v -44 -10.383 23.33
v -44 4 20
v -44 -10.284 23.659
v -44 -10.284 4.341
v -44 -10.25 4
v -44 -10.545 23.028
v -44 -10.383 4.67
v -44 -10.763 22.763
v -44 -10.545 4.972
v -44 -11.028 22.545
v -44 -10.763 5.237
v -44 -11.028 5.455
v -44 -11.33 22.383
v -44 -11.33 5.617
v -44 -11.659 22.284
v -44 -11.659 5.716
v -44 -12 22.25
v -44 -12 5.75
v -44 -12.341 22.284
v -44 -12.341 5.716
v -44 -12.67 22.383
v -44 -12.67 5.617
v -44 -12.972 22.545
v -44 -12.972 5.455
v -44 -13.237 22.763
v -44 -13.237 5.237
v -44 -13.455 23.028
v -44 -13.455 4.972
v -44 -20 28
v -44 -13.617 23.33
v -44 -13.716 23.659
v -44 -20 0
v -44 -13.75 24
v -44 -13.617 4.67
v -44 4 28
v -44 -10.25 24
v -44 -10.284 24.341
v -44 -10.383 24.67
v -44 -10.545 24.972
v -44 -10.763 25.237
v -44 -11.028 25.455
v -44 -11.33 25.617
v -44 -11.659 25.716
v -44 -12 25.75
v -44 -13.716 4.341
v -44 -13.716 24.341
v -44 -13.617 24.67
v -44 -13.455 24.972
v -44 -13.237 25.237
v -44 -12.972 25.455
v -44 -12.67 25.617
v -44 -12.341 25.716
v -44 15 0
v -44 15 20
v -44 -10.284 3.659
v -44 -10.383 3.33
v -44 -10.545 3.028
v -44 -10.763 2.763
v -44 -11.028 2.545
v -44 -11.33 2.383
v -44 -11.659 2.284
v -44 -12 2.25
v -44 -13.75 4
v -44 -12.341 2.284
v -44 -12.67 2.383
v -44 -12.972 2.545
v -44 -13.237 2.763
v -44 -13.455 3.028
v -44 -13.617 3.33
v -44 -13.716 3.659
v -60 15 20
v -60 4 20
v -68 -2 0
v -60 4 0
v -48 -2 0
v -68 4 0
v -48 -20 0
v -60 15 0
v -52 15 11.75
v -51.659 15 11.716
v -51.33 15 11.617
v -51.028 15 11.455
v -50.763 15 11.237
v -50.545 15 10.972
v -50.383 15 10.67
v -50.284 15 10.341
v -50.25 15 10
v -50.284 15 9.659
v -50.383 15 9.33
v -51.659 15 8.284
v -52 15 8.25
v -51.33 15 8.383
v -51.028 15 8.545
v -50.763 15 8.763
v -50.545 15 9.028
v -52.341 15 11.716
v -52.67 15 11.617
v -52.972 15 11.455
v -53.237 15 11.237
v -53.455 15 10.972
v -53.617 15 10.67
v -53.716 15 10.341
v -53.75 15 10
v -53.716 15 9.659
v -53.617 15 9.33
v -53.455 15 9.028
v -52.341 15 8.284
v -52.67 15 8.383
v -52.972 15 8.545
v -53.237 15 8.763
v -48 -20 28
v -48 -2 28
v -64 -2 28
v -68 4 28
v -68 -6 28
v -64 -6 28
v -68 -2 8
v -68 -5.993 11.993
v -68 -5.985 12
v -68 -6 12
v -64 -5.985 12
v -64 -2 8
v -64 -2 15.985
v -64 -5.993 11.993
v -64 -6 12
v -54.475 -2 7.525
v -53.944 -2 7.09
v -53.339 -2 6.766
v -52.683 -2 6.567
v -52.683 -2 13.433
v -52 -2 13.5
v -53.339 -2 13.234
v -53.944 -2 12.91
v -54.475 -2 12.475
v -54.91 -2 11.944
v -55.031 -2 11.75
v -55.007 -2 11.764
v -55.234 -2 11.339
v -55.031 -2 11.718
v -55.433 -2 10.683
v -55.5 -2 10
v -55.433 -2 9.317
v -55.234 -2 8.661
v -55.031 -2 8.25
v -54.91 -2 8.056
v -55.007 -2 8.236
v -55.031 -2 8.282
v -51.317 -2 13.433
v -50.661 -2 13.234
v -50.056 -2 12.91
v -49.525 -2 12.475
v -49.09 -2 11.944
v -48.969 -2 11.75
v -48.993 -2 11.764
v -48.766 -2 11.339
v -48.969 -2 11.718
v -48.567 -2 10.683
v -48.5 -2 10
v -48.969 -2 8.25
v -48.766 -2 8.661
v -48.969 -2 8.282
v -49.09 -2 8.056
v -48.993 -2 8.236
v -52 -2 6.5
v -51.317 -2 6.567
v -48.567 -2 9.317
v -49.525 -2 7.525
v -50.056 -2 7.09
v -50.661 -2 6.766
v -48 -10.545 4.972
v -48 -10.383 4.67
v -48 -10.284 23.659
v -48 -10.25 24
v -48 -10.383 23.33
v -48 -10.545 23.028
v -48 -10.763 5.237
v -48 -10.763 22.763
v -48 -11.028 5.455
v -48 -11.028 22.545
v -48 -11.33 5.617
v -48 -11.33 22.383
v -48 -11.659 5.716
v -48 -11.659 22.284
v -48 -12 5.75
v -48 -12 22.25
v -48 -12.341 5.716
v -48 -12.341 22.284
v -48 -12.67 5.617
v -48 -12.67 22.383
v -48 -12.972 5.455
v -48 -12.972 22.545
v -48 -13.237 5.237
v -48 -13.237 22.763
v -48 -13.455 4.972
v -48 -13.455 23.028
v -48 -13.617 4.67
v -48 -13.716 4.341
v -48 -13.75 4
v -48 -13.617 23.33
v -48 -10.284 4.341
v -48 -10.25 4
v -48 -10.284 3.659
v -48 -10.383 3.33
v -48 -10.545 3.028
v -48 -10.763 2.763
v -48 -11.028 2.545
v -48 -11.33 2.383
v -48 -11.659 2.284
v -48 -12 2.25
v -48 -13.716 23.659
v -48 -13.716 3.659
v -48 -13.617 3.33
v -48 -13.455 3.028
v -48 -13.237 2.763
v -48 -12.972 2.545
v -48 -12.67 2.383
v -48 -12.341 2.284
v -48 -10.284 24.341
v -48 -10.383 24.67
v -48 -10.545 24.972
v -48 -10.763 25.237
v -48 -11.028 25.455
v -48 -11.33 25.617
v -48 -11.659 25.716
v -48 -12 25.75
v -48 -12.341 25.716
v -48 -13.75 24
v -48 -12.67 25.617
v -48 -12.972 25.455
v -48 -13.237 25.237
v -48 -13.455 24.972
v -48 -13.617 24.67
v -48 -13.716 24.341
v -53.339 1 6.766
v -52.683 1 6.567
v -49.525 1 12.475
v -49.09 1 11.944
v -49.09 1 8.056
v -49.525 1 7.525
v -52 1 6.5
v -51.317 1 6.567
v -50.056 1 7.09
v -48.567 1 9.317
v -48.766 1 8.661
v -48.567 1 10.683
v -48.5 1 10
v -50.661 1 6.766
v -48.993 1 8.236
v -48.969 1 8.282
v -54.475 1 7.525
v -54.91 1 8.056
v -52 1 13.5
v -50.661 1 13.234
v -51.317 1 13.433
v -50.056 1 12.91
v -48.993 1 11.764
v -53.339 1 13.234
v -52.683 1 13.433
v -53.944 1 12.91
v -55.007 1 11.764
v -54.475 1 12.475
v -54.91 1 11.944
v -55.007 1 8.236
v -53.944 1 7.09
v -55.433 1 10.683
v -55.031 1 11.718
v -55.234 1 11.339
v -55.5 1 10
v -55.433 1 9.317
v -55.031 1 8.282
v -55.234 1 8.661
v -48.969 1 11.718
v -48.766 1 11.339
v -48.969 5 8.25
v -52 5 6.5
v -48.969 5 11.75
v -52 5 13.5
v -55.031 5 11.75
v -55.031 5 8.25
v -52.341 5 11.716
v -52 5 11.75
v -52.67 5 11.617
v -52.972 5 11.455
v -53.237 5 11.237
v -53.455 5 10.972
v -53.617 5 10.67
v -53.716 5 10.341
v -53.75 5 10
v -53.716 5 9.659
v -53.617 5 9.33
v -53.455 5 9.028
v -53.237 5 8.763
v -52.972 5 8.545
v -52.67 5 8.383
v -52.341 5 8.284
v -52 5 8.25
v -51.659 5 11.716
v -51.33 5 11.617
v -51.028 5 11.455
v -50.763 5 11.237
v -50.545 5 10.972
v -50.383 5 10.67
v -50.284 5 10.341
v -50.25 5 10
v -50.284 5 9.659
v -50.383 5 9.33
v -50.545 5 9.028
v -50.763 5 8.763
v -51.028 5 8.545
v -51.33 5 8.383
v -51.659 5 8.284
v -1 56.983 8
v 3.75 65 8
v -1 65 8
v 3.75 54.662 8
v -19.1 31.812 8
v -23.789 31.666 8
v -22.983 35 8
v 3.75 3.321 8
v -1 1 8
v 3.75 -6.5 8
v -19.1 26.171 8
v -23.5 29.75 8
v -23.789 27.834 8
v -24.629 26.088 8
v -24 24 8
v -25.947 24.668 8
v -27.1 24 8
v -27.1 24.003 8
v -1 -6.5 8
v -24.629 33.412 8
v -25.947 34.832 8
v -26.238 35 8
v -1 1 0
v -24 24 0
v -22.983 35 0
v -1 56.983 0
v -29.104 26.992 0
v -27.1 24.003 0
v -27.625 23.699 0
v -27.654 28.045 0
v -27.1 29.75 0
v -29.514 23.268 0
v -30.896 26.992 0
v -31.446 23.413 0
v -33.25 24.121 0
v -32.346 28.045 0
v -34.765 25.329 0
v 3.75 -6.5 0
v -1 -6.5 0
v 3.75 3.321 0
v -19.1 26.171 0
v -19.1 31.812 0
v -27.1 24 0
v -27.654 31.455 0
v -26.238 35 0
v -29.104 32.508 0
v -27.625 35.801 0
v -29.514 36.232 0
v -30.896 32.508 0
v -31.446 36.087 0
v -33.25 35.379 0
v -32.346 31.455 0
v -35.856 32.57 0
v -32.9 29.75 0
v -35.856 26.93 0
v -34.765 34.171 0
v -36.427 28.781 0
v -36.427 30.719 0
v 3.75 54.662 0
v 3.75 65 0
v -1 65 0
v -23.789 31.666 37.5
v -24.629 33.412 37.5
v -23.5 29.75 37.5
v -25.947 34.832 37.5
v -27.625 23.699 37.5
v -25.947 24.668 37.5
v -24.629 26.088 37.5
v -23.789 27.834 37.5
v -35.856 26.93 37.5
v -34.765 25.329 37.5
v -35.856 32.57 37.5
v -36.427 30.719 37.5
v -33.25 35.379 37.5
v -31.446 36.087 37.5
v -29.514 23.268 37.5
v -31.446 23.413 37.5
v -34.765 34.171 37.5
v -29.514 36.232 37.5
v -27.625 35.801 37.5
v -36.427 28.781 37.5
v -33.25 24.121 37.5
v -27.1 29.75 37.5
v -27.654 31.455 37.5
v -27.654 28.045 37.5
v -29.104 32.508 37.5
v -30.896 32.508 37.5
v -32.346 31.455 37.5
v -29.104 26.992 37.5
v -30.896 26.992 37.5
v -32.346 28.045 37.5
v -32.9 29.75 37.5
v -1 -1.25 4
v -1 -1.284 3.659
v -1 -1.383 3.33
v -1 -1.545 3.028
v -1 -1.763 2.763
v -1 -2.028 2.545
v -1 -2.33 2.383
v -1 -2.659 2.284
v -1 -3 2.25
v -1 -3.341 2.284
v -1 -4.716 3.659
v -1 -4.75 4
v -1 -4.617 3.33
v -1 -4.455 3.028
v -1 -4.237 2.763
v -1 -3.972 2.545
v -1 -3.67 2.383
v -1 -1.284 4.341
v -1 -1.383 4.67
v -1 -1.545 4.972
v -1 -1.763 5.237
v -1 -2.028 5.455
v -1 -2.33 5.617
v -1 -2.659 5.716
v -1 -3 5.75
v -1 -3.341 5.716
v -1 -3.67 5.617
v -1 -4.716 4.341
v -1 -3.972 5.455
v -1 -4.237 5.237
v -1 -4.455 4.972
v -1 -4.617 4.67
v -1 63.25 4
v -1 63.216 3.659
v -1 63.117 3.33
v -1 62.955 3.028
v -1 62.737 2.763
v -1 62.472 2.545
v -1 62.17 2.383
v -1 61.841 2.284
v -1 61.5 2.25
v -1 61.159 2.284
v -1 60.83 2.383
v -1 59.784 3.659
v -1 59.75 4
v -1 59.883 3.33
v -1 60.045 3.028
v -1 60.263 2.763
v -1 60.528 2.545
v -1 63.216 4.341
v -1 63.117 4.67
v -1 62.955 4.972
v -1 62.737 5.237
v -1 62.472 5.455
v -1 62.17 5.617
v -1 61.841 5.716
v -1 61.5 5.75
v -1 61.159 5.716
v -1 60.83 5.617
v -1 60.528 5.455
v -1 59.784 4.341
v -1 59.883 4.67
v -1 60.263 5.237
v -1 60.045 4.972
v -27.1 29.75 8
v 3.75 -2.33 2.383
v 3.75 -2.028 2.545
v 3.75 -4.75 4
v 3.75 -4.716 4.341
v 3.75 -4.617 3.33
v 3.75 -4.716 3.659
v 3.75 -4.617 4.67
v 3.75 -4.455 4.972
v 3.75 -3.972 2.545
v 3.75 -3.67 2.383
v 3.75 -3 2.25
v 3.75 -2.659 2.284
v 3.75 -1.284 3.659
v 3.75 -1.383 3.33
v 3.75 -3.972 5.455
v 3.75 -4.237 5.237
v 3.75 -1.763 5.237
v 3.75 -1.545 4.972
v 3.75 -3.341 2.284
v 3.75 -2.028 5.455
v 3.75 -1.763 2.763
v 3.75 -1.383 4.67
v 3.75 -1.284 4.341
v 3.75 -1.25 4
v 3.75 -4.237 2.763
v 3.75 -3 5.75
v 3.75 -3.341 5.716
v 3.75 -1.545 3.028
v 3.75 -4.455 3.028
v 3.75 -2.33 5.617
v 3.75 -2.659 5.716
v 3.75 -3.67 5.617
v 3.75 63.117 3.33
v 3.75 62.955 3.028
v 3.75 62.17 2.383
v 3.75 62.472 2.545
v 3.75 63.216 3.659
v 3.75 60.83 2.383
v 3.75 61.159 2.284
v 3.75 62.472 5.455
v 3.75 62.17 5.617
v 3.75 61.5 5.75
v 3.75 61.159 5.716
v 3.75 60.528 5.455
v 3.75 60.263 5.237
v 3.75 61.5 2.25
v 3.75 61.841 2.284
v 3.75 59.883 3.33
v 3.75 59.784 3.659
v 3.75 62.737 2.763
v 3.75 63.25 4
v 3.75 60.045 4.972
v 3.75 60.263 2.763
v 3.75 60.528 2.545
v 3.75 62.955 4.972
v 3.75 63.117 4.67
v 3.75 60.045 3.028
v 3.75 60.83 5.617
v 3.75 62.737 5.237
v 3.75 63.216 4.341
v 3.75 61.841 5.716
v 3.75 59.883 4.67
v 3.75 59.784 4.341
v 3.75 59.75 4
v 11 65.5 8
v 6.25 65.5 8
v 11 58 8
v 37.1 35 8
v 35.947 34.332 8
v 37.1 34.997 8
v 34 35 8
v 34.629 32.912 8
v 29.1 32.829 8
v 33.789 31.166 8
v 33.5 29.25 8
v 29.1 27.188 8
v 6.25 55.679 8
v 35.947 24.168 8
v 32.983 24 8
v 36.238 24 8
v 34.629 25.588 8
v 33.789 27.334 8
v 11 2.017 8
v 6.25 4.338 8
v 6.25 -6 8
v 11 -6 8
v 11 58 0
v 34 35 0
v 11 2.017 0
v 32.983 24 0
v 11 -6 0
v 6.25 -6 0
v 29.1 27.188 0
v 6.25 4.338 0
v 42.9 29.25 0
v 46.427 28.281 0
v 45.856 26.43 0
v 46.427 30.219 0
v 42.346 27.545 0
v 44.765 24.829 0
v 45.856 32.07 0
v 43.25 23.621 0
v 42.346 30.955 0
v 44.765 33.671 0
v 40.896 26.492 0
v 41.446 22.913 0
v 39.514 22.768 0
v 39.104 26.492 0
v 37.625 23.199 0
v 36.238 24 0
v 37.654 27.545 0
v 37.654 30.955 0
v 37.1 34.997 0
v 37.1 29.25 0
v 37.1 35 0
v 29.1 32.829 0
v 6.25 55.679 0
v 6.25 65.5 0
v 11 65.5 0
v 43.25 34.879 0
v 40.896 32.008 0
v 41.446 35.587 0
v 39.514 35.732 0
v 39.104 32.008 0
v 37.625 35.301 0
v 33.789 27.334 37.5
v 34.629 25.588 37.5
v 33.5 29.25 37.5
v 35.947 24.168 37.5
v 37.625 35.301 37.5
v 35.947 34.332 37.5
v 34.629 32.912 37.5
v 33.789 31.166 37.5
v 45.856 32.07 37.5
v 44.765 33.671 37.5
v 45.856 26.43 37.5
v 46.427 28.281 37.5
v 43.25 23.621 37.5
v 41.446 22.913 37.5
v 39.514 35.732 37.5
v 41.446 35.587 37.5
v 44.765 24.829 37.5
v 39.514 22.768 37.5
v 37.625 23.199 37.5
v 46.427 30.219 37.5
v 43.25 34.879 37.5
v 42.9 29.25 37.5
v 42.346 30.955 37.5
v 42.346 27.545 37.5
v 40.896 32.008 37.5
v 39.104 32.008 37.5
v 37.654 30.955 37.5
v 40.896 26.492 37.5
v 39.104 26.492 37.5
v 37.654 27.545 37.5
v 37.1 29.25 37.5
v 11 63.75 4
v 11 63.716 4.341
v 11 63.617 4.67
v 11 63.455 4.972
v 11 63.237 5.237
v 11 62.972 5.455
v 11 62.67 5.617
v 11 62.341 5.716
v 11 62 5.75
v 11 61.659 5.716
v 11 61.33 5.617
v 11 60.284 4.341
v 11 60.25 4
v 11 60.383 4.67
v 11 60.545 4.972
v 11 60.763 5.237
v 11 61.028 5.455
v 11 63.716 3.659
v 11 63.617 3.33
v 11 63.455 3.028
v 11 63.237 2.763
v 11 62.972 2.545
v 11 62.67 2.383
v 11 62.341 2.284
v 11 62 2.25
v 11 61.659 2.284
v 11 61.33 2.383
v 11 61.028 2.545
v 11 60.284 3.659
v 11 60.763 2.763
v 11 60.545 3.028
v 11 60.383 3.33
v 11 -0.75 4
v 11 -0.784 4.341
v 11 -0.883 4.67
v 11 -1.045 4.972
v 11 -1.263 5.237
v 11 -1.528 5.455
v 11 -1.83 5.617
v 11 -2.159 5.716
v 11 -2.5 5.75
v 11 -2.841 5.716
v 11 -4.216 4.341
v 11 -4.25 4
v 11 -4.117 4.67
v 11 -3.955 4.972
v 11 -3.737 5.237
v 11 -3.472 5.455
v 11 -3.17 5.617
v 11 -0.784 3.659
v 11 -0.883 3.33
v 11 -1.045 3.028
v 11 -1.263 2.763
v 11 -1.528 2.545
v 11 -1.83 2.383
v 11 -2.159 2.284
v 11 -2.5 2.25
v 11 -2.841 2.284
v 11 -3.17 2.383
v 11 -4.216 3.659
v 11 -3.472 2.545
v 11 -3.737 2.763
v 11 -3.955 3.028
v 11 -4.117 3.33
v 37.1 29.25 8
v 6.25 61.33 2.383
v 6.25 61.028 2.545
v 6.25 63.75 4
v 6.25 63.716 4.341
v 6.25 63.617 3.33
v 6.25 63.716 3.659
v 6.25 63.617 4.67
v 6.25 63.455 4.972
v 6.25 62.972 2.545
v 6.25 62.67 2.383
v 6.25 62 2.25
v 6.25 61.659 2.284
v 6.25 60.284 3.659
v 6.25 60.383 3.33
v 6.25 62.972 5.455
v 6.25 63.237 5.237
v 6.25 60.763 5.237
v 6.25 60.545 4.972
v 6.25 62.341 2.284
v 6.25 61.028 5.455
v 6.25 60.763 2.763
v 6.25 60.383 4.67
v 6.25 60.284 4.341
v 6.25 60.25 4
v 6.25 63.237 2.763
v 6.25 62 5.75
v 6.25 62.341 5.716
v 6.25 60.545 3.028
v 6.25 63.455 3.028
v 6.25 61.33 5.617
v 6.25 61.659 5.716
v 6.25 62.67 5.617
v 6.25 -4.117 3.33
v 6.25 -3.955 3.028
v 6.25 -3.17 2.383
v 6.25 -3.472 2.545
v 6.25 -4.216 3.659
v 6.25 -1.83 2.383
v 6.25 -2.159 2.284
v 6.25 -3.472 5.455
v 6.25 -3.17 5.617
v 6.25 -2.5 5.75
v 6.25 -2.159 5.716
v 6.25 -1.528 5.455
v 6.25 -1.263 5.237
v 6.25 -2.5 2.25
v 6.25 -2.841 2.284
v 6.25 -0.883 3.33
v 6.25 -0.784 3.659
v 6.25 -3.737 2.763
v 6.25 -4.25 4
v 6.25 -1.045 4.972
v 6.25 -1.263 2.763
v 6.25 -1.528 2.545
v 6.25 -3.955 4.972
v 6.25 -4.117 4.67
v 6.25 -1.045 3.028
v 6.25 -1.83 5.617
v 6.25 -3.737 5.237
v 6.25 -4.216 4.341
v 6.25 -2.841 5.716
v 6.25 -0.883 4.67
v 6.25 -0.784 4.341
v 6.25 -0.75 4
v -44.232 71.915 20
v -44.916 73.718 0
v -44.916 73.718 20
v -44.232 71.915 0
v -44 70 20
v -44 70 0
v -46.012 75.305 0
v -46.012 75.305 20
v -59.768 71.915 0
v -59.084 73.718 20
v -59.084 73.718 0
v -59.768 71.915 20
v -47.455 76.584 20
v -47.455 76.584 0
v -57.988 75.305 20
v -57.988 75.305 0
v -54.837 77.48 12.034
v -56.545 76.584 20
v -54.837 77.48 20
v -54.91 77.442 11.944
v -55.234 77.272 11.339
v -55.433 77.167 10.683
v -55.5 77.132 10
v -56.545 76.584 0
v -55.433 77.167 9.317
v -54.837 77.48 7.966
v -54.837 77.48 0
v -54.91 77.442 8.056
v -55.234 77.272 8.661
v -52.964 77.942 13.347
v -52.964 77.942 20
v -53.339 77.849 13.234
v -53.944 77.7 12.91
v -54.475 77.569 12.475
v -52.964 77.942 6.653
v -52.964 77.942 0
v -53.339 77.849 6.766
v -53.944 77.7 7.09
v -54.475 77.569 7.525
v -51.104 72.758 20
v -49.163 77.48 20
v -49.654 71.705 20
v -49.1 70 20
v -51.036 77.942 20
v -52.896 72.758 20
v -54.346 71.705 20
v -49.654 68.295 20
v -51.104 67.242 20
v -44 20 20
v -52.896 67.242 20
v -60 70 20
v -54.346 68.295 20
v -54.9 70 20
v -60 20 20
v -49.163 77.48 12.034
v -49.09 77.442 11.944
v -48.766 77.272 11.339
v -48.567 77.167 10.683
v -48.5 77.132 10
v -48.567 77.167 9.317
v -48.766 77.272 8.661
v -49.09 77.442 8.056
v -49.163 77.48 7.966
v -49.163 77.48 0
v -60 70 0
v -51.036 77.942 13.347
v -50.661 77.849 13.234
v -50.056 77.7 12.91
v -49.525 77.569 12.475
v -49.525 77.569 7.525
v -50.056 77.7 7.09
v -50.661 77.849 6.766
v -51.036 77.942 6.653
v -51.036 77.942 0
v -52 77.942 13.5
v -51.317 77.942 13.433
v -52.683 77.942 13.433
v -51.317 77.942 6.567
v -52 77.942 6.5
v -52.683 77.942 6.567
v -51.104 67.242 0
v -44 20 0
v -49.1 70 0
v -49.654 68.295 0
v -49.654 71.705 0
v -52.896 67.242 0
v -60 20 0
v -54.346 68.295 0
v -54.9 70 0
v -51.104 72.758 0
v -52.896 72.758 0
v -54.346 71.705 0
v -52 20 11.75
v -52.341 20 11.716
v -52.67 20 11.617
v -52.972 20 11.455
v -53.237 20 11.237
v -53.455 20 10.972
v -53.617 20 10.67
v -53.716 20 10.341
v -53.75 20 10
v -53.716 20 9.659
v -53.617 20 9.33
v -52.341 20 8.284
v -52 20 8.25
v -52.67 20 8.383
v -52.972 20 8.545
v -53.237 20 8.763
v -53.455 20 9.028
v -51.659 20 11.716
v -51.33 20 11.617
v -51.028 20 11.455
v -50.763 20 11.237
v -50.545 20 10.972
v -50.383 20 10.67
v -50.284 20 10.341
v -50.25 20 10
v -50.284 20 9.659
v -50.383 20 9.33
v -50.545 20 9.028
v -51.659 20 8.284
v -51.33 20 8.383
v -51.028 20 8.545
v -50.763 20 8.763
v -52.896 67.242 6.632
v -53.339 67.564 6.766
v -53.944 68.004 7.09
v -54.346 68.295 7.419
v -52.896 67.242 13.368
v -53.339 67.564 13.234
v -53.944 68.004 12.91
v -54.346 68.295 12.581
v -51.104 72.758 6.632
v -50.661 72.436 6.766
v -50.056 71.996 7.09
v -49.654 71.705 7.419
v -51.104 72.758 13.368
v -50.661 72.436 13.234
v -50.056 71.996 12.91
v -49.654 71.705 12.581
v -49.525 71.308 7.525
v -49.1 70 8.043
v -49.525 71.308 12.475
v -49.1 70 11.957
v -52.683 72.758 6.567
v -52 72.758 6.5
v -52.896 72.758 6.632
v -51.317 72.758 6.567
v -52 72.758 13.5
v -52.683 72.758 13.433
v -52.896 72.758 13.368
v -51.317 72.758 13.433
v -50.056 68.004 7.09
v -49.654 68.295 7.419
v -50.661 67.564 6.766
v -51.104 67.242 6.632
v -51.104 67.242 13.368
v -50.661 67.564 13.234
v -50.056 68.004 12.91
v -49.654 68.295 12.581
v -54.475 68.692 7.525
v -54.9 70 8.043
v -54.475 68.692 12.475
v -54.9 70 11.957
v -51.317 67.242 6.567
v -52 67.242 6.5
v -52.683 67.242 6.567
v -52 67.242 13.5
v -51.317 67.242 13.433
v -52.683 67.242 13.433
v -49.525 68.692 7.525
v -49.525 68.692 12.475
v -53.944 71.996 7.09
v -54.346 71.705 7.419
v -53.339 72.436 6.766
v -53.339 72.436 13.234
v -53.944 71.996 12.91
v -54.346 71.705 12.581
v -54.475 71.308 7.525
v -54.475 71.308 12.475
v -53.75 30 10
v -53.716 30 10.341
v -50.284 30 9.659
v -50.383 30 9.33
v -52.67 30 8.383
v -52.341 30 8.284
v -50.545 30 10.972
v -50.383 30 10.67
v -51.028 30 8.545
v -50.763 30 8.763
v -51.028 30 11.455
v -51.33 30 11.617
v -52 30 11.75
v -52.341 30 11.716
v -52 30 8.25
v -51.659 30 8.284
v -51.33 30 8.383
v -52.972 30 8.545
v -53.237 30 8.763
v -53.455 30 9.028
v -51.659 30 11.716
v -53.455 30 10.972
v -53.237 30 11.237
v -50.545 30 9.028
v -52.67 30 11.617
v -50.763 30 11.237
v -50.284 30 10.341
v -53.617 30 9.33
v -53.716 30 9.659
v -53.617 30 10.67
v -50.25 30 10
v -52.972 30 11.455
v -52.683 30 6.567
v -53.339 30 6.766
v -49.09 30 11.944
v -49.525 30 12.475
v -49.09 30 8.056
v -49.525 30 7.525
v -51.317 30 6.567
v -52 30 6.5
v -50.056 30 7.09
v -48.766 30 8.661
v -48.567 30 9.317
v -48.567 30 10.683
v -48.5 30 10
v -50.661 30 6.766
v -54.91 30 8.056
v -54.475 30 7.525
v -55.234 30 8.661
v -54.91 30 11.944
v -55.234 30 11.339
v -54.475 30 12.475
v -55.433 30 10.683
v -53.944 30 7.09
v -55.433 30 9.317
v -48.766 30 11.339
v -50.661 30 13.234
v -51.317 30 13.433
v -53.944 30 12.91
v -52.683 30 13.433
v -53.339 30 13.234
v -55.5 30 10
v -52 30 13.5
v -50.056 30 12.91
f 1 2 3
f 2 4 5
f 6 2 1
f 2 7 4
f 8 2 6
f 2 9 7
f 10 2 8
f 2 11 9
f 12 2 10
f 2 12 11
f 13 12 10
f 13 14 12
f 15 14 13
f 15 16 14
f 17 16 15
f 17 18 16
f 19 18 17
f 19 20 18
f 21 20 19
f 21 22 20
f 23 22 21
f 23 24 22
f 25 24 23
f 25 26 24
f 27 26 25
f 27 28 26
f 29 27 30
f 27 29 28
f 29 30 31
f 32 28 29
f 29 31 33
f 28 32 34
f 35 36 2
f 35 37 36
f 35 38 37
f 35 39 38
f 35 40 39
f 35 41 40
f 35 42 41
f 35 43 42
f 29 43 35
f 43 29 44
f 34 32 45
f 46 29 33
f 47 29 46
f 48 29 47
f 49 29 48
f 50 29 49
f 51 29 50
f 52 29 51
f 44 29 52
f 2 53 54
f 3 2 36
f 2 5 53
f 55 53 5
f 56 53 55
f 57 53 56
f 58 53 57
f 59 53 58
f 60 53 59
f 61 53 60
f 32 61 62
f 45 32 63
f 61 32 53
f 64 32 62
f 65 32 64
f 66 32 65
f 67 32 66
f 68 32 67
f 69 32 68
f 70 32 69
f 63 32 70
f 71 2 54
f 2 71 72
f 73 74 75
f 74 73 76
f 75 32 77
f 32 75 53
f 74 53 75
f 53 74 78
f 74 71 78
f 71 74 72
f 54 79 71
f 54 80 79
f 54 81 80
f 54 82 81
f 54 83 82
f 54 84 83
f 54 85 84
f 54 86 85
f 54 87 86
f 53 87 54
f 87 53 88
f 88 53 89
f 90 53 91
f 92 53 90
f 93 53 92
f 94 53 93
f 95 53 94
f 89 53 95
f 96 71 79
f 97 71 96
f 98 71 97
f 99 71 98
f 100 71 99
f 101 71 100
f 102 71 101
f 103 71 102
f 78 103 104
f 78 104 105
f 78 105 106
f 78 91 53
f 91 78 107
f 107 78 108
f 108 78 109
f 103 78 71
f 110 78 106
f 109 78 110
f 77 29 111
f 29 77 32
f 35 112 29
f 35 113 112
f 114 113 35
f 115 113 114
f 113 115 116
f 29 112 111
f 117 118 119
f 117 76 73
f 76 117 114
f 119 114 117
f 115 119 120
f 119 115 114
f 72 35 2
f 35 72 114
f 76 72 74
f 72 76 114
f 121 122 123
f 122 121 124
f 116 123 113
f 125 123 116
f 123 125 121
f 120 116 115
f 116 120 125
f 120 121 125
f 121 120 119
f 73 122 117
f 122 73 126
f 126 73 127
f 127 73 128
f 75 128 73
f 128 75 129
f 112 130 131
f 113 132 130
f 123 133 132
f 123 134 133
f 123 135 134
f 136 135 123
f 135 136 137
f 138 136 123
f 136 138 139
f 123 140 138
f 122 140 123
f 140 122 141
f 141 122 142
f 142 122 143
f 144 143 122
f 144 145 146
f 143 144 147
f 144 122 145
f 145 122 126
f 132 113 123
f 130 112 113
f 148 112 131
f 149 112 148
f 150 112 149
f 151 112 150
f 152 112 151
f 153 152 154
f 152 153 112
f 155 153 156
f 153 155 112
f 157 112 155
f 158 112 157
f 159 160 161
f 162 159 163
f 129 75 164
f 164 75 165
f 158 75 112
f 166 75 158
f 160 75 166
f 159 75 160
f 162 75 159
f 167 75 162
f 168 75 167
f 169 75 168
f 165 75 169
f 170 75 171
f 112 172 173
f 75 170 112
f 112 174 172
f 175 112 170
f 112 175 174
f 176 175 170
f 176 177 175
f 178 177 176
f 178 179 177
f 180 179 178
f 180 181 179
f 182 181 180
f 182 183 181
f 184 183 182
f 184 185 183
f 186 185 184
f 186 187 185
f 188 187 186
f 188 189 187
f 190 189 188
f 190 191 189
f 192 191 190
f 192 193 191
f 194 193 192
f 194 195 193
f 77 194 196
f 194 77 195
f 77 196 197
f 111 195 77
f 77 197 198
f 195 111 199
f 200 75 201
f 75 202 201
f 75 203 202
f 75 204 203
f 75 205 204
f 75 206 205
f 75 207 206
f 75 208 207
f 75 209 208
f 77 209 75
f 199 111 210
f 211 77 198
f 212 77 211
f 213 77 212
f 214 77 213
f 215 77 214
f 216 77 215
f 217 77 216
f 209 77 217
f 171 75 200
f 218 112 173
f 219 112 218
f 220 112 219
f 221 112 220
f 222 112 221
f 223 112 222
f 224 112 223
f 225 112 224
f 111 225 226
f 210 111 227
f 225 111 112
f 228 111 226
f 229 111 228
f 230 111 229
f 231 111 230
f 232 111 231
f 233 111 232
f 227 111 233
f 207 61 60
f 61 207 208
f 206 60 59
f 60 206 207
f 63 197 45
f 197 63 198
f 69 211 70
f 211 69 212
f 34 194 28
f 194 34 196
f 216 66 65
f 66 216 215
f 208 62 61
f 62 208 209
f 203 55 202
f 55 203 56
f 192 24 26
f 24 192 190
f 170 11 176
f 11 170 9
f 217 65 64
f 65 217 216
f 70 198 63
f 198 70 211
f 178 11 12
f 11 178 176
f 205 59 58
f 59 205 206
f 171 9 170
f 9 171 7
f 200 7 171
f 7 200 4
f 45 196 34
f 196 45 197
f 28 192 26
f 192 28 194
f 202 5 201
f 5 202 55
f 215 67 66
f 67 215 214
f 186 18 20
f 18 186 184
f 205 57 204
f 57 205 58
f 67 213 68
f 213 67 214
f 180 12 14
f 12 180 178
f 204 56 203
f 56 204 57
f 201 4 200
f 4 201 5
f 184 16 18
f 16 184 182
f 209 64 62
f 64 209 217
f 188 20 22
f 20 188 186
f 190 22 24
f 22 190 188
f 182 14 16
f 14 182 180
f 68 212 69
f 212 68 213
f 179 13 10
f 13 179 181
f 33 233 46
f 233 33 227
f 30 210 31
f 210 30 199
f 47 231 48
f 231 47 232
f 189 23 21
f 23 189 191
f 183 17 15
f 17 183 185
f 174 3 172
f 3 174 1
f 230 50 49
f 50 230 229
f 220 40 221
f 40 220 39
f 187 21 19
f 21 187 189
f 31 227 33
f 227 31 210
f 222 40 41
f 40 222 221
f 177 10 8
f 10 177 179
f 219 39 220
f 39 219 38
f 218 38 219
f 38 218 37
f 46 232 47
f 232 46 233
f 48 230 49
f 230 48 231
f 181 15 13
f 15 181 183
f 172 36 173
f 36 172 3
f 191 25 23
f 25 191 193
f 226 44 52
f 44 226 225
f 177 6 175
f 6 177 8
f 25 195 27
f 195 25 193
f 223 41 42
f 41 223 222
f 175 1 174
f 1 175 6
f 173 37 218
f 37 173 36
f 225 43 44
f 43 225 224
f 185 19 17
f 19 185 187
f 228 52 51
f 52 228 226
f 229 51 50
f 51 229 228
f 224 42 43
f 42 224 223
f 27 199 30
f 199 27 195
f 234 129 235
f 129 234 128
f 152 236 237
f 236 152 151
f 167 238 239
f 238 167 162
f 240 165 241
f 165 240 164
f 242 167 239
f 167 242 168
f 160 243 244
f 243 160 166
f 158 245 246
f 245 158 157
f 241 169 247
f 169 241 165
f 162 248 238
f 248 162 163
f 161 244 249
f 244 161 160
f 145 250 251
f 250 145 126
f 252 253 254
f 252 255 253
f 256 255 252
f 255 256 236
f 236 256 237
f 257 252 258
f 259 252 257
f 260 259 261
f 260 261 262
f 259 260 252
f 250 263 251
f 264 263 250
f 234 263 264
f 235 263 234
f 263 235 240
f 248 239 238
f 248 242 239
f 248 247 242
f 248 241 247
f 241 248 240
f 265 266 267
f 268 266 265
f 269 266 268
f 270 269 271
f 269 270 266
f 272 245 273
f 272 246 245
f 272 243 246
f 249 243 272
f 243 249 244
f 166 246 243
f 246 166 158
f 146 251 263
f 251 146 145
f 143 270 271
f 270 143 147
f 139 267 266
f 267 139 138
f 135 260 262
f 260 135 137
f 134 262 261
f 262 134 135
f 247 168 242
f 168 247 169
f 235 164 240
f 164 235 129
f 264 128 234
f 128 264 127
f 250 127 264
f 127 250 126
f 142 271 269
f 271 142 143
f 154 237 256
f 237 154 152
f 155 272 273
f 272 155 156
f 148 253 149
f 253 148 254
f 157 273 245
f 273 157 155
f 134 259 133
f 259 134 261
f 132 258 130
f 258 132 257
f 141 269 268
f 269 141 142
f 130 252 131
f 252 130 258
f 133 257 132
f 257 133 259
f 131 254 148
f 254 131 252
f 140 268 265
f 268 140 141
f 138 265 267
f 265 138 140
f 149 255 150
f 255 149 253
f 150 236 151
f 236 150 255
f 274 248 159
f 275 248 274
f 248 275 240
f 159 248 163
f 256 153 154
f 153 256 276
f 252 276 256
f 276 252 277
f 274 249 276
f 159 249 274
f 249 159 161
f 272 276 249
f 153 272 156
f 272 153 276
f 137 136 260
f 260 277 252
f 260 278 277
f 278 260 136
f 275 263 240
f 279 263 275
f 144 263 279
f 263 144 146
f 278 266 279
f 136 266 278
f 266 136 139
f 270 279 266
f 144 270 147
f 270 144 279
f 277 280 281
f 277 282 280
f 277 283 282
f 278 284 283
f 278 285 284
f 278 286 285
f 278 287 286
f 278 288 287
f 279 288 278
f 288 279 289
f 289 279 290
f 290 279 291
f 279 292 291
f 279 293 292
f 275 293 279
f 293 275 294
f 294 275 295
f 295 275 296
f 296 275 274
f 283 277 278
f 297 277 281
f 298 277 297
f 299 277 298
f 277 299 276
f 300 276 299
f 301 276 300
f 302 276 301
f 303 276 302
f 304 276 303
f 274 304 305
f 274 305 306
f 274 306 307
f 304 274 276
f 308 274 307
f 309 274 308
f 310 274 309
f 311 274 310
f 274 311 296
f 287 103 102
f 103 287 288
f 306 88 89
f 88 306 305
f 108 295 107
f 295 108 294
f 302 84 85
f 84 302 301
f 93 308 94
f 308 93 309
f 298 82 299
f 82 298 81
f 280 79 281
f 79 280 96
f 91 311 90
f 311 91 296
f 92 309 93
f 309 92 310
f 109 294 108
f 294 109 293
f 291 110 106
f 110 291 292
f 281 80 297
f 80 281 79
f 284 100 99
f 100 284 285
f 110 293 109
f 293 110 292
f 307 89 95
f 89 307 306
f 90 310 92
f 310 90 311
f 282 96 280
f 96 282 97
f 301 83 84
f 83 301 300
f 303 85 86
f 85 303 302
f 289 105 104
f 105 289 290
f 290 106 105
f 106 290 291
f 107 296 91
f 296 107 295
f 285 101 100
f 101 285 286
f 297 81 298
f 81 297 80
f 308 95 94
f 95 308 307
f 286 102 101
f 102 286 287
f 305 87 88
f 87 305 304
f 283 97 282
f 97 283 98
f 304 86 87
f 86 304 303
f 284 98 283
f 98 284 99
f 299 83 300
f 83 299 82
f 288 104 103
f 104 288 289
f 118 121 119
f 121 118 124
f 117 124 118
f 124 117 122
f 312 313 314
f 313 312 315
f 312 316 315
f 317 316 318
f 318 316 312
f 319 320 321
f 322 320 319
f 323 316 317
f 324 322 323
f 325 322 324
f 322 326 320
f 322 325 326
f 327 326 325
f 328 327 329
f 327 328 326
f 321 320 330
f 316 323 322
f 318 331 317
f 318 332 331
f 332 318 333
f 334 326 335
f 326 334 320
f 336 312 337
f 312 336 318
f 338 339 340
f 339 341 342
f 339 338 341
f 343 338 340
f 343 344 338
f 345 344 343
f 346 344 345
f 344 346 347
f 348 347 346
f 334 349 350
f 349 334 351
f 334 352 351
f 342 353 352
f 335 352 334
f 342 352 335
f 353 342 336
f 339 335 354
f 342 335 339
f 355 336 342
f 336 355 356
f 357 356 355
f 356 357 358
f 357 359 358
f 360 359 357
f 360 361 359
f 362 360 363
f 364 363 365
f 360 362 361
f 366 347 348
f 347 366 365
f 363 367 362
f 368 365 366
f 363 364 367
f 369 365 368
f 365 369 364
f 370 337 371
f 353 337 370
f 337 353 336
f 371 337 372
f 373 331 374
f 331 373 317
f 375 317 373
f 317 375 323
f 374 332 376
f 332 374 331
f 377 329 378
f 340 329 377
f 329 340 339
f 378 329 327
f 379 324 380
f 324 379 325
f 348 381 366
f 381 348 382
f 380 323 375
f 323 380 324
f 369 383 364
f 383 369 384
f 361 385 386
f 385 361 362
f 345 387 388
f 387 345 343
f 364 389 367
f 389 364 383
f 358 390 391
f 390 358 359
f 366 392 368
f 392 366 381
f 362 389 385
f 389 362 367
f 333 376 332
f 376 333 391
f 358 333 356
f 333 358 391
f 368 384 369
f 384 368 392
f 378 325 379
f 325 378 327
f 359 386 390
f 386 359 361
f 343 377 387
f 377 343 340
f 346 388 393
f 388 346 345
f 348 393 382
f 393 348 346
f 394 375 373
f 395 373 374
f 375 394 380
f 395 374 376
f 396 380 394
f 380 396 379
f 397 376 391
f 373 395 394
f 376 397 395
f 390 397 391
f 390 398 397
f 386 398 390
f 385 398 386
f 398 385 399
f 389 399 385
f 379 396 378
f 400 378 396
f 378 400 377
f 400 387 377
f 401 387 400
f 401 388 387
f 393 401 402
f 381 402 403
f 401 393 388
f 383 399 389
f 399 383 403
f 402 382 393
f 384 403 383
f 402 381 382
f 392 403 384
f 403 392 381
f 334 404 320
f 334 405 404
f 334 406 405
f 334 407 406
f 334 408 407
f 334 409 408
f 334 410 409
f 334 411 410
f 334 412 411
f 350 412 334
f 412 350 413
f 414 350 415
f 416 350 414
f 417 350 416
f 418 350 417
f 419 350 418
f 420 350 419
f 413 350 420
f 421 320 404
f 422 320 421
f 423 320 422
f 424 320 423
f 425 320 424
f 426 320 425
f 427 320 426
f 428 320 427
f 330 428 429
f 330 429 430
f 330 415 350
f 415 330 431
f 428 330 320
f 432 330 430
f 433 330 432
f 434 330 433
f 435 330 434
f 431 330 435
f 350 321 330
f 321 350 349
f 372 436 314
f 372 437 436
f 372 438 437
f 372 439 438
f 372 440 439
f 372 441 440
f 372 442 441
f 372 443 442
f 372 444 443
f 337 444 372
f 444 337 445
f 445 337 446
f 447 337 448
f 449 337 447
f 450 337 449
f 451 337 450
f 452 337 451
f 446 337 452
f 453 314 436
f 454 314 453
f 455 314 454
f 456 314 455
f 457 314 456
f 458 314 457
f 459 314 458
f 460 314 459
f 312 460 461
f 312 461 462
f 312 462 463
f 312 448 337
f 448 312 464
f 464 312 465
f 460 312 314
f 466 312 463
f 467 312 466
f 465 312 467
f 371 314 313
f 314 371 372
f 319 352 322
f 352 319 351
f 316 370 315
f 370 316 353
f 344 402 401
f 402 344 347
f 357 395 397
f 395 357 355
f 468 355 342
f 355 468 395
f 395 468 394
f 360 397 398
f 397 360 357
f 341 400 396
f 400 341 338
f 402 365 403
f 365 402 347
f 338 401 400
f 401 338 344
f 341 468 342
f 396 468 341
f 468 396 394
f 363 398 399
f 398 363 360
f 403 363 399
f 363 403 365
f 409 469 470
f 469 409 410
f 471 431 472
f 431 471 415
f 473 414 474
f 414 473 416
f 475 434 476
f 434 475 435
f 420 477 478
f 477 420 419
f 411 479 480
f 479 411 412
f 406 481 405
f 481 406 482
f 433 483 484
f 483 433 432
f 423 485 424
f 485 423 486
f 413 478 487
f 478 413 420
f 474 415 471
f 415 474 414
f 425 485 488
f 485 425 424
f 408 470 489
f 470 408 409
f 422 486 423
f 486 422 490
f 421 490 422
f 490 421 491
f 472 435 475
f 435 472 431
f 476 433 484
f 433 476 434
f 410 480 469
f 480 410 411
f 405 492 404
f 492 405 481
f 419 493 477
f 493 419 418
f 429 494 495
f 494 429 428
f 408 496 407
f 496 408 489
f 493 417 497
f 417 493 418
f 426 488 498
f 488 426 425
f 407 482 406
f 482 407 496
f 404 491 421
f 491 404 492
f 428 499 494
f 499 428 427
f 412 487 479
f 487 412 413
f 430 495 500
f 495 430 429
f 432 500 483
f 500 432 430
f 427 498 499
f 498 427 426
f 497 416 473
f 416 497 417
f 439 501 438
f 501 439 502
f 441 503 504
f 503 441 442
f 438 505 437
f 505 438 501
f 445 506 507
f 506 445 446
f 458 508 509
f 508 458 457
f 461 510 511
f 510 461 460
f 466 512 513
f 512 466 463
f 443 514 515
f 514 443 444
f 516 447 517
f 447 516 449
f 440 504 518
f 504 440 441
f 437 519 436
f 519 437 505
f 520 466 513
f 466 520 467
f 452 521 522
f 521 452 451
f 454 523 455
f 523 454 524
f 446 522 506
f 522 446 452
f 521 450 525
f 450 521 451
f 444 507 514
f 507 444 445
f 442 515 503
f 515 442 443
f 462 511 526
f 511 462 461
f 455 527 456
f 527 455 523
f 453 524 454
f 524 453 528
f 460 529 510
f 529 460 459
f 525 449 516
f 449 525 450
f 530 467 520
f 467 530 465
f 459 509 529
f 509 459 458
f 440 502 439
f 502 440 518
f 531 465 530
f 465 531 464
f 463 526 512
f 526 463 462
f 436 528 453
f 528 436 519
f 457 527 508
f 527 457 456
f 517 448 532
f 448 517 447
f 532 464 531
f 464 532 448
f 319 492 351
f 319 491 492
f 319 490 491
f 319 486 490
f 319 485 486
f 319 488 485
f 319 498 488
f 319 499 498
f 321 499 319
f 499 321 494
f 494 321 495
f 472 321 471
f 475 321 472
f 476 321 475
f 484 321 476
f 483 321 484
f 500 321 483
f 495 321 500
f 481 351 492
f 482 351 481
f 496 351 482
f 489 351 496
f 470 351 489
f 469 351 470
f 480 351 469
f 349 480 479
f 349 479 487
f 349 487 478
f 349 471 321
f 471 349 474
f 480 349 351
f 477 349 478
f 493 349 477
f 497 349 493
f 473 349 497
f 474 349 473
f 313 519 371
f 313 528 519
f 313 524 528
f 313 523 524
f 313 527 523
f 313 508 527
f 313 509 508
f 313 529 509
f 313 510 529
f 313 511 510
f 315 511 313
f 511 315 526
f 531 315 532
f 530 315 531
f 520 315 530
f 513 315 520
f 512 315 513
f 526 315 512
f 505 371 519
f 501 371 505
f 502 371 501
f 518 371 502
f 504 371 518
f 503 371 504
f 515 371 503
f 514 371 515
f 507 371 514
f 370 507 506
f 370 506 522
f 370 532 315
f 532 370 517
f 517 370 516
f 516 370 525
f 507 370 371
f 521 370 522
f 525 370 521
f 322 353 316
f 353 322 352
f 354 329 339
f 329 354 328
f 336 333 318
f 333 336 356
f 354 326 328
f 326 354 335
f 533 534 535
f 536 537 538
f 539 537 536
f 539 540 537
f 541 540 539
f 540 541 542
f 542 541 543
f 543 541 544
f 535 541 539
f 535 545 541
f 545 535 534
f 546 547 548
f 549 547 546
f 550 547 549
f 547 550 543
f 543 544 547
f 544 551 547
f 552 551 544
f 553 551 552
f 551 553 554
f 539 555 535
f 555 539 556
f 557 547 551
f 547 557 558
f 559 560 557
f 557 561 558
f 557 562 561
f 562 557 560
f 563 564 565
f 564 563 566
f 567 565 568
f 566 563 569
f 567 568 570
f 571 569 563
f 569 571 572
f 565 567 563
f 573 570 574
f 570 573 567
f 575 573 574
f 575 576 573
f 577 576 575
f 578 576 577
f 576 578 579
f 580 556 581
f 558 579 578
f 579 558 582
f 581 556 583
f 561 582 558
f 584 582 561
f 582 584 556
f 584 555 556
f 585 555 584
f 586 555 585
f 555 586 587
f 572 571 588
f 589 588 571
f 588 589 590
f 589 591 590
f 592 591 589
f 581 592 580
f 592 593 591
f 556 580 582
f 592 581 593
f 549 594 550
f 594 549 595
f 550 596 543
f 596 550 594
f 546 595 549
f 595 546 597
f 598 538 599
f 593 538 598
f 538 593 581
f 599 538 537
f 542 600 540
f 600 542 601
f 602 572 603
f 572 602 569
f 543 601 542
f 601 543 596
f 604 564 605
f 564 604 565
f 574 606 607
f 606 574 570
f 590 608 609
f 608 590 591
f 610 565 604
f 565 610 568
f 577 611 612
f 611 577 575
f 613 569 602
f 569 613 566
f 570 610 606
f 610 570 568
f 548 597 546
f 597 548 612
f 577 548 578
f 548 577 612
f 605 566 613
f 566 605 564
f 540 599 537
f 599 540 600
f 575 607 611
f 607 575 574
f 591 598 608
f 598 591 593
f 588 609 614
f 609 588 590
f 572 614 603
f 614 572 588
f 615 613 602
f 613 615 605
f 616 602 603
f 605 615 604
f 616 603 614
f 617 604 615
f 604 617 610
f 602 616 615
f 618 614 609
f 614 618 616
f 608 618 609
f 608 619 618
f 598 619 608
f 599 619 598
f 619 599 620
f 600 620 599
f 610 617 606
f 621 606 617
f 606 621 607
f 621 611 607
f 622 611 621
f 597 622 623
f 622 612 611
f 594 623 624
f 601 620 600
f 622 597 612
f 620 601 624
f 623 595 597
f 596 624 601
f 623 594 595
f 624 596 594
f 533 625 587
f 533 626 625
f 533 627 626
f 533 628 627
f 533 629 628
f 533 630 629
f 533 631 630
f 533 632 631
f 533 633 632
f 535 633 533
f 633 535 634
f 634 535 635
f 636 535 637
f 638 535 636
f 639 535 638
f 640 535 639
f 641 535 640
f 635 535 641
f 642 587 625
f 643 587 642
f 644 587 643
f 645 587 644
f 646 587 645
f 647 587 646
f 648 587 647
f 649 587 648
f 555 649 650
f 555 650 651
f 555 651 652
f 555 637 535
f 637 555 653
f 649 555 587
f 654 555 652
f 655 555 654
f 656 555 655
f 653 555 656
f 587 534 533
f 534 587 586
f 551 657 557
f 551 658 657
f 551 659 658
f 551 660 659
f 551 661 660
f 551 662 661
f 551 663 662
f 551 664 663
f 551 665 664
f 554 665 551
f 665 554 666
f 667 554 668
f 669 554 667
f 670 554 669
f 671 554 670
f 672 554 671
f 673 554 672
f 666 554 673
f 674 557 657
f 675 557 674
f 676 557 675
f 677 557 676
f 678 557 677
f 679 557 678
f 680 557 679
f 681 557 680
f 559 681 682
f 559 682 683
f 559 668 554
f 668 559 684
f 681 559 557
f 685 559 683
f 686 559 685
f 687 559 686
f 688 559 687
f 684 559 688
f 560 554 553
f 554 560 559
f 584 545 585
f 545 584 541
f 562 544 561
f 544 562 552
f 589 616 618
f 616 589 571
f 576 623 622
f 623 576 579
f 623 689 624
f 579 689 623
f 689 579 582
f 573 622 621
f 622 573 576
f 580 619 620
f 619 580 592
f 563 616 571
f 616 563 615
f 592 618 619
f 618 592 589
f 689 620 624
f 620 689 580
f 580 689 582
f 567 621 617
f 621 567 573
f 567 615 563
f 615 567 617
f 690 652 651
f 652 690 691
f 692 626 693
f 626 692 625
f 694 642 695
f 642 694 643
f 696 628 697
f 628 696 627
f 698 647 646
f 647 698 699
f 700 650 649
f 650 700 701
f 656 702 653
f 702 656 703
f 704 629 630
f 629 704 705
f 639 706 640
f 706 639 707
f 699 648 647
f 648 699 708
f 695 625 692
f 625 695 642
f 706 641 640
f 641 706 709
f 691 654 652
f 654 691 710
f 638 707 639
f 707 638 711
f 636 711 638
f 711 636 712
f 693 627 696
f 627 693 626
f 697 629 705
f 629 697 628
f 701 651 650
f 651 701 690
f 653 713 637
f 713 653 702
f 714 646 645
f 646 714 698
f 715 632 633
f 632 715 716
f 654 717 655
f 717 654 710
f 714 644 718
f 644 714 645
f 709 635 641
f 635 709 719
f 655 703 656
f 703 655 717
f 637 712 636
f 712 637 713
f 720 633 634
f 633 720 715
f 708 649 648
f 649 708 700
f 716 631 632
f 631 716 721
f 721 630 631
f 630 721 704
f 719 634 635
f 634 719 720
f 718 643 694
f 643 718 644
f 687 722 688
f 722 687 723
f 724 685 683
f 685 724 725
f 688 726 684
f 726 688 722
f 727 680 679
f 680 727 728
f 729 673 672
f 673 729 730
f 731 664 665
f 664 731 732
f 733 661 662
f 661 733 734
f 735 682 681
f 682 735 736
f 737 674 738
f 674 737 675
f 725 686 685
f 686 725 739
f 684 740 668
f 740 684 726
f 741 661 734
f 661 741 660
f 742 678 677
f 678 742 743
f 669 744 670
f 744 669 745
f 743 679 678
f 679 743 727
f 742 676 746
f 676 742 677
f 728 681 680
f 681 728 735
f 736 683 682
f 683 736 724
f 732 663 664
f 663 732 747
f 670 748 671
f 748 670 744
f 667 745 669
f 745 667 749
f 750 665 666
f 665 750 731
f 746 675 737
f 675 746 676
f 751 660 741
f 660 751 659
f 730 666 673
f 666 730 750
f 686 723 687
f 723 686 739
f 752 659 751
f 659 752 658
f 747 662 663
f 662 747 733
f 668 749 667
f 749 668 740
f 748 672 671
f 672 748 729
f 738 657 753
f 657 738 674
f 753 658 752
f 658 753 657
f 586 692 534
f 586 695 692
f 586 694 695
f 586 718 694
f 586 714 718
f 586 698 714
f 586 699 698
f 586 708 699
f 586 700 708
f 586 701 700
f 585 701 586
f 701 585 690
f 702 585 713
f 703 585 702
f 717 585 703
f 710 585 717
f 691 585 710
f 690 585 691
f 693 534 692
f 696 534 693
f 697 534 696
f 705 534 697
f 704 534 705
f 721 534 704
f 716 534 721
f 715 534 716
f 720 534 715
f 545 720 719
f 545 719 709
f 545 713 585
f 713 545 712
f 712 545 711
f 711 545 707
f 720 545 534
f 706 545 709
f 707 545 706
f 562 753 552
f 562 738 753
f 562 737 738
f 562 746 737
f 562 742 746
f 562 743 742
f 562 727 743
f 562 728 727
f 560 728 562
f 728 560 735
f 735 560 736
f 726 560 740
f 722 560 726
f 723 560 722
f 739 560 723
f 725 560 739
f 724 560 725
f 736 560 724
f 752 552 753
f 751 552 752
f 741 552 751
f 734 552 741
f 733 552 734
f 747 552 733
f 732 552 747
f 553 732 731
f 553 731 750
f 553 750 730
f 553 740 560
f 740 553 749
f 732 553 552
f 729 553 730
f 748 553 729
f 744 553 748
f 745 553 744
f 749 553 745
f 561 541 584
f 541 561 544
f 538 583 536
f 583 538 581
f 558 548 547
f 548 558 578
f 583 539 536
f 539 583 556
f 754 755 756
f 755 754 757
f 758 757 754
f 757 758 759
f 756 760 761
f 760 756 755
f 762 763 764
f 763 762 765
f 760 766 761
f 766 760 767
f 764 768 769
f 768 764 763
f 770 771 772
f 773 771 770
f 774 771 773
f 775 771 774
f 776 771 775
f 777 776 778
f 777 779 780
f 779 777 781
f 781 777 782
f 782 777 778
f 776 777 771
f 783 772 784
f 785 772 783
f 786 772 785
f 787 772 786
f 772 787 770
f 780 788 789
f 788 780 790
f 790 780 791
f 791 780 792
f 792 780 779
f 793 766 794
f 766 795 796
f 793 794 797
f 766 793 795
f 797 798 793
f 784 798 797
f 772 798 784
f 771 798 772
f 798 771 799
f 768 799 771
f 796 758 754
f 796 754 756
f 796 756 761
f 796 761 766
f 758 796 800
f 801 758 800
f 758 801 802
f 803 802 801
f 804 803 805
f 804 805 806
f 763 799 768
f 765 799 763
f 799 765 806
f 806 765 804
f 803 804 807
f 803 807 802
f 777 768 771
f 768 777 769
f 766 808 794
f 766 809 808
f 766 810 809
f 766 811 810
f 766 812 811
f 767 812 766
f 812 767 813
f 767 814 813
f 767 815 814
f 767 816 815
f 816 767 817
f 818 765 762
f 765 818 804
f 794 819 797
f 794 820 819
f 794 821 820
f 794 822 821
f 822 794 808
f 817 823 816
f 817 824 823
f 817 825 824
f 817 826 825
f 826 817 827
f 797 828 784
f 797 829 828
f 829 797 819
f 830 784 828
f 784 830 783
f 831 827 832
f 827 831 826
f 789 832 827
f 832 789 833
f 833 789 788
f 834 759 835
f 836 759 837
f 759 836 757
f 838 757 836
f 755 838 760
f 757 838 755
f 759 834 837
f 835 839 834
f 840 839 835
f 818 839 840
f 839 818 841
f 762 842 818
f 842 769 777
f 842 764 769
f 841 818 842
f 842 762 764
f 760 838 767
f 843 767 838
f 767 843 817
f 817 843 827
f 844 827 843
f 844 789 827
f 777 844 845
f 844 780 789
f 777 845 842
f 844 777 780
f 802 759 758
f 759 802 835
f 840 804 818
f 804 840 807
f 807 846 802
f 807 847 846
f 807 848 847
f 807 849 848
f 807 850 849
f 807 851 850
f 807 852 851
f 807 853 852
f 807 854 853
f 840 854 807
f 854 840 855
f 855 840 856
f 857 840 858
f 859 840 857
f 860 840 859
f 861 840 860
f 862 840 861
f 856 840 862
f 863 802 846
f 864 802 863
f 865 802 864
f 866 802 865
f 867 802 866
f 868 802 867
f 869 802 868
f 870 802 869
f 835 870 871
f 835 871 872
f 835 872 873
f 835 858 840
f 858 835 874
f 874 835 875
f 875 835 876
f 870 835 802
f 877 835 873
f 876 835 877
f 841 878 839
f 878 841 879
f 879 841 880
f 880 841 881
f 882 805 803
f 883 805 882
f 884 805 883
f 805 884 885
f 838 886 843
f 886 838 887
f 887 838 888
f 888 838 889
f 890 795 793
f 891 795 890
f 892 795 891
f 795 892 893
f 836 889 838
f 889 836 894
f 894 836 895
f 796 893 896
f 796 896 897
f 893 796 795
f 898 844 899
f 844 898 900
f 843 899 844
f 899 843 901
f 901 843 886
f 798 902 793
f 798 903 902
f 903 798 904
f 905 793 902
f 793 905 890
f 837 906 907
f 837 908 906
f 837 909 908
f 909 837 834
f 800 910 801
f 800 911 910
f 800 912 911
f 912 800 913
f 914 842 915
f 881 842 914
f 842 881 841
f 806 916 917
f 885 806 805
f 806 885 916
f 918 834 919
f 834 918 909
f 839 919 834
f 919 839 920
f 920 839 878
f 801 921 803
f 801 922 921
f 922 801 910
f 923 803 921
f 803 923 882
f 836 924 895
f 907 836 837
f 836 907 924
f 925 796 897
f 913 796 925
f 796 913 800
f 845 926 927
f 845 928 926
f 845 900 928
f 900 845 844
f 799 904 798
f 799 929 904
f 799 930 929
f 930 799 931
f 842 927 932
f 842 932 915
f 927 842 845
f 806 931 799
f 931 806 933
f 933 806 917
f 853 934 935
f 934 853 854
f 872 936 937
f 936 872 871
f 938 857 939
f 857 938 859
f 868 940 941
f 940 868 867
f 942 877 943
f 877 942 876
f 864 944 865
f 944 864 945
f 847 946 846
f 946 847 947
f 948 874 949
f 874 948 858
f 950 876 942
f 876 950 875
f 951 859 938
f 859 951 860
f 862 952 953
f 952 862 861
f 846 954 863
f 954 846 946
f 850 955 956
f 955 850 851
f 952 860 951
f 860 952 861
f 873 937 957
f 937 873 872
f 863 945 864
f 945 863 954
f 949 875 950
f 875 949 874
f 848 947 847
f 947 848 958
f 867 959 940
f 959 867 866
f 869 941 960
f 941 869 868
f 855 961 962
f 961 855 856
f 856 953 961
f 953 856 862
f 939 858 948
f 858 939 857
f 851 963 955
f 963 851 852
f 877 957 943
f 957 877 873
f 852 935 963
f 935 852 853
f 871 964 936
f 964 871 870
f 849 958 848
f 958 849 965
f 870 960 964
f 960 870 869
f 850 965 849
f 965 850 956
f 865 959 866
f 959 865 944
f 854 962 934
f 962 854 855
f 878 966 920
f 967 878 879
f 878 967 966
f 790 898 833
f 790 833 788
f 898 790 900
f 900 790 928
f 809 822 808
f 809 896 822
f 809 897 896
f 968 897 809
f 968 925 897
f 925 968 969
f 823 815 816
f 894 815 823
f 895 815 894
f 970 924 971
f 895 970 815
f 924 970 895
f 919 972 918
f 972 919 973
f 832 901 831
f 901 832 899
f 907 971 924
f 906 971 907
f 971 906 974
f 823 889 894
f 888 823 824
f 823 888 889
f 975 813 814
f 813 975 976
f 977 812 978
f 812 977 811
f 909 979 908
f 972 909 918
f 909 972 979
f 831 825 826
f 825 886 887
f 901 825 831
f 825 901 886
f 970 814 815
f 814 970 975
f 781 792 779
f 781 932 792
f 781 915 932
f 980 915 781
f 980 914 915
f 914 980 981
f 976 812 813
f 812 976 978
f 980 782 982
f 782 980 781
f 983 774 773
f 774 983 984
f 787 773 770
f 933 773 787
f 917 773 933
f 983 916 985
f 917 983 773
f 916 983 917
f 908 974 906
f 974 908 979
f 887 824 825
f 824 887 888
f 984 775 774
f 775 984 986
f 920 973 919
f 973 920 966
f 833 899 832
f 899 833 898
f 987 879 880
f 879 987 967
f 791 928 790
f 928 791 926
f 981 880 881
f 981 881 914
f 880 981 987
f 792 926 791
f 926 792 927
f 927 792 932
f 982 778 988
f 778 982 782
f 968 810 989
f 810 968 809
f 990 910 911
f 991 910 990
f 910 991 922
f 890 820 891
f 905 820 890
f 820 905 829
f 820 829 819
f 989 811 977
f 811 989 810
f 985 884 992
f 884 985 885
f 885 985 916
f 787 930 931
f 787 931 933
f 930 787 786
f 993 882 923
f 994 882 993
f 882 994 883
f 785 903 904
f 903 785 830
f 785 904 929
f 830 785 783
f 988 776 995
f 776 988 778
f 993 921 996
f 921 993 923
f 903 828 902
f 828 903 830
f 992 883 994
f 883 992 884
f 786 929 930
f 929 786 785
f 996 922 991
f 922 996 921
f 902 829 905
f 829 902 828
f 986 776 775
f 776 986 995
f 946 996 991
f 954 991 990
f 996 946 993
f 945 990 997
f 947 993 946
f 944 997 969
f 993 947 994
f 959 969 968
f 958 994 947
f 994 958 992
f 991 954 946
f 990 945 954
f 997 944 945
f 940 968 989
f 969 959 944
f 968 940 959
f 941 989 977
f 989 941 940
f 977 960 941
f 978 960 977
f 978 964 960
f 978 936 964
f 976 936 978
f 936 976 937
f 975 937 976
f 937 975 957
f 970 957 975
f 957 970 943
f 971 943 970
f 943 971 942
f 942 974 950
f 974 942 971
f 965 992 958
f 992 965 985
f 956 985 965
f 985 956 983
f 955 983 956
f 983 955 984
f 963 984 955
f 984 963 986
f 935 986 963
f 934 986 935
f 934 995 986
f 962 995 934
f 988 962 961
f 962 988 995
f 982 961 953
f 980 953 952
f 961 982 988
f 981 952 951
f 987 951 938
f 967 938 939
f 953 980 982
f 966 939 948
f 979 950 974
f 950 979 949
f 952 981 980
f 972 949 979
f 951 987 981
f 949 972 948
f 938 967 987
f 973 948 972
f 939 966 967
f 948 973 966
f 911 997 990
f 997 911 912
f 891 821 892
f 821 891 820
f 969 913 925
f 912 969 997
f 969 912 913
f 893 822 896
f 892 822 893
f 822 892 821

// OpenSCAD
// This script creates a bracket for mounting the RepRapDiscount graphic LCD
// panel on top of the left side Z axis mount.
//
// Parts required:
//
// (1) 110 mm M5 rod
// (1) M5 locking nut
// (1) M5 hand twist nut
// (2) M5 washer
// (4) 3mm x 15mm bolts for arms
// (2) 3mm x 20mm bolts for base
// (1) 3mm x 25mm bolts for rotating parts
// (7) 3mm nuts
// (2) 3mm washers (optional)
// 
// Instructions: (old, for non rotation version)
//
// 1) print out all parts
// 2) remove the (2) bolts holding your top left Z axis bracket
// 3) place base of mount on top of frame and thread the 20mm bolts
//    through the top Z-axis bracket and the base (see photo on
//    Thingiverse) then add 3mm washers and nuts and tighten
// 4) mount arms to the LCD panel with the spacer side pointing 
//    toward the center
// 5) thread the 5/16" bolt through the arms and base 
// 6) adjust and tighten the 5/16" bolt
// 7) connect LCD panel ribbon cables
// 
// Created by: drcharlesbell@gmail.com
//
// Enjoy!

module bracket() {
  difference() {
    union() {
      rotate([0,0,45]) translate([0,-1,0]) cube([42,42,8]);
      translate([-30,29.75,0]) cylinder(37.5,6.5,6.5);
      translate([-1,-6.5,0]) cube([5,9,8]);
      translate([-1,55.5,0]) cube([5,9.5,8]);
    }
    rotate([0,0,45]) translate([5,-1,0]) cube([37,37,8]);
    translate([-30,29.75,0]) cylinder(38.5,2.9,2.9); //for M5 rods
    rotate([0,90,0]) translate([-4,-3,-1]) cylinder(10,1.75,1.75,$fn=32);
    rotate([0,90,0]) translate([-4,61.5,-1]) cylinder(10,1.75,1.75,$fn=32);
    translate([3.75,-7,0]) cube([3,100,10]);
  }
  translate([-27.1,24,0]) cube([8,11,8]);
}

module top_clamp_center() {
  difference() {
    union() {
      translate([0,-15,0]) cube([55,20,20]);
      translate([48,20,0]) cylinder(20,8,8);
      translate([40,-15,0]) cube([16,35,20]);
    }
    // cutout for frame
    translate([5,-11,0]) cube([40,7,20]);
    translate([10,-21,0]) cube([30,10,20]);
    // bolt for clamp and nut trap
    translate([-1,0,5]) rotate([0,90,0]) cylinder(25,1.75,1.75,$fn=32);
    translate([17,0,5]) rotate([0,90,0]) cylinder(3,3.3,3.3,$fn=6);
    // nut trap
    translate([17,-9,2.15]) cube([3,10,5.7]);
    // bolt for clamp and nut trap
    translate([-1,0,15]) rotate([0,90,0]) cylinder(25,1.75,1.75,$fn=32);
    translate([17,0,15]) rotate([0,90,0]) cylinder(3,3.3,3.3,$fn=6);
    // nut trap
    translate([17,-9,12.15]) cube([3,10,5.7]);
    // slice
    translate([11,-10,0]) cube([0.75,40,20]);
    // rod
    translate([48,20,0]) cylinder(22,4.25,4.25);
  }
}

module top_clamp_side() {
rHex = 7/2;
  difference() {
    union() {
      translate([0,-20,0]) cube([16,35,20]);
      translate([-8,-20,0]) cube([24,24,28]);
    }
    // cutout for frame
    translate([-8,-20,0]) cube([4,14,28]);
    translate([-8,-20,0]) cube([4,18,12]);
    translate([-4,-20,0]) cube([4,18,28]);
    translate([-4,-20,0]) cube([16,18,28]);
   // rod
    translate([10,-12,4]) rotate([0,90,0]) cylinder(10,1.75,1.75,$fn=32);
    translate([10,-12,24]) rotate([0,90,0]) cylinder(10,1.75,1.75,$fn=32);
    translate([8,1,10])rotate([90,90,0]) cylinder(5,3.5,3.5,$fn=32);
    translate([8,5,10]){
		rotate([90,0,0,]) linear_extrude(10,center = false,2,twist = 0,slices = 20)
			polygon(points=[[sin(360*1/6)*rHex, cos(360*1/6)*rHex],[sin(360*2/6)*rHex, cos(360*2/6)*rHex],[sin(360*3/6)*rHex, cos(360*3/6)*rHex],[sin(360*4/6)*rHex, cos(360*4/6)*rHex],[sin(360*5/6)*rHex, cos(360*5/6)*rHex],[sin(360*6/6)*rHex, cos(360*6/6)*rHex]]);}
	

	// m3 screw
   translate([8,16,10])rotate([90,90,0]) cylinder(20,1.75,1.75,$fn=32);
  }
   translate([-8,-1.75,7.75]) rotate([45,0,0]) cube([4,6,6]);


}
module rotating_head() {
  difference() {
    union() {
      translate([8,70,0]) cylinder(20,8,8);
      translate([0,20,0]) cube([16,50,20]);
     }
    // rod
    translate([8,70,0]) cylinder(22,2.9,2.9); //for M5 rods

	// m3 screw
   translate([8,69,10])rotate([90,90,0]) cylinder(50,1.75,1.75,$fn=32);
   translate([8,80,10])rotate([90,90,0]) cylinder(50,3.5,3.5,$fn=32);
  }
  
}



translate([-60,0,0]) top_clamp_side();
rotate([0,0,180]) translate([-10,-59,0]) bracket();
bracket();
translate([-60,0,0])rotating_head();
